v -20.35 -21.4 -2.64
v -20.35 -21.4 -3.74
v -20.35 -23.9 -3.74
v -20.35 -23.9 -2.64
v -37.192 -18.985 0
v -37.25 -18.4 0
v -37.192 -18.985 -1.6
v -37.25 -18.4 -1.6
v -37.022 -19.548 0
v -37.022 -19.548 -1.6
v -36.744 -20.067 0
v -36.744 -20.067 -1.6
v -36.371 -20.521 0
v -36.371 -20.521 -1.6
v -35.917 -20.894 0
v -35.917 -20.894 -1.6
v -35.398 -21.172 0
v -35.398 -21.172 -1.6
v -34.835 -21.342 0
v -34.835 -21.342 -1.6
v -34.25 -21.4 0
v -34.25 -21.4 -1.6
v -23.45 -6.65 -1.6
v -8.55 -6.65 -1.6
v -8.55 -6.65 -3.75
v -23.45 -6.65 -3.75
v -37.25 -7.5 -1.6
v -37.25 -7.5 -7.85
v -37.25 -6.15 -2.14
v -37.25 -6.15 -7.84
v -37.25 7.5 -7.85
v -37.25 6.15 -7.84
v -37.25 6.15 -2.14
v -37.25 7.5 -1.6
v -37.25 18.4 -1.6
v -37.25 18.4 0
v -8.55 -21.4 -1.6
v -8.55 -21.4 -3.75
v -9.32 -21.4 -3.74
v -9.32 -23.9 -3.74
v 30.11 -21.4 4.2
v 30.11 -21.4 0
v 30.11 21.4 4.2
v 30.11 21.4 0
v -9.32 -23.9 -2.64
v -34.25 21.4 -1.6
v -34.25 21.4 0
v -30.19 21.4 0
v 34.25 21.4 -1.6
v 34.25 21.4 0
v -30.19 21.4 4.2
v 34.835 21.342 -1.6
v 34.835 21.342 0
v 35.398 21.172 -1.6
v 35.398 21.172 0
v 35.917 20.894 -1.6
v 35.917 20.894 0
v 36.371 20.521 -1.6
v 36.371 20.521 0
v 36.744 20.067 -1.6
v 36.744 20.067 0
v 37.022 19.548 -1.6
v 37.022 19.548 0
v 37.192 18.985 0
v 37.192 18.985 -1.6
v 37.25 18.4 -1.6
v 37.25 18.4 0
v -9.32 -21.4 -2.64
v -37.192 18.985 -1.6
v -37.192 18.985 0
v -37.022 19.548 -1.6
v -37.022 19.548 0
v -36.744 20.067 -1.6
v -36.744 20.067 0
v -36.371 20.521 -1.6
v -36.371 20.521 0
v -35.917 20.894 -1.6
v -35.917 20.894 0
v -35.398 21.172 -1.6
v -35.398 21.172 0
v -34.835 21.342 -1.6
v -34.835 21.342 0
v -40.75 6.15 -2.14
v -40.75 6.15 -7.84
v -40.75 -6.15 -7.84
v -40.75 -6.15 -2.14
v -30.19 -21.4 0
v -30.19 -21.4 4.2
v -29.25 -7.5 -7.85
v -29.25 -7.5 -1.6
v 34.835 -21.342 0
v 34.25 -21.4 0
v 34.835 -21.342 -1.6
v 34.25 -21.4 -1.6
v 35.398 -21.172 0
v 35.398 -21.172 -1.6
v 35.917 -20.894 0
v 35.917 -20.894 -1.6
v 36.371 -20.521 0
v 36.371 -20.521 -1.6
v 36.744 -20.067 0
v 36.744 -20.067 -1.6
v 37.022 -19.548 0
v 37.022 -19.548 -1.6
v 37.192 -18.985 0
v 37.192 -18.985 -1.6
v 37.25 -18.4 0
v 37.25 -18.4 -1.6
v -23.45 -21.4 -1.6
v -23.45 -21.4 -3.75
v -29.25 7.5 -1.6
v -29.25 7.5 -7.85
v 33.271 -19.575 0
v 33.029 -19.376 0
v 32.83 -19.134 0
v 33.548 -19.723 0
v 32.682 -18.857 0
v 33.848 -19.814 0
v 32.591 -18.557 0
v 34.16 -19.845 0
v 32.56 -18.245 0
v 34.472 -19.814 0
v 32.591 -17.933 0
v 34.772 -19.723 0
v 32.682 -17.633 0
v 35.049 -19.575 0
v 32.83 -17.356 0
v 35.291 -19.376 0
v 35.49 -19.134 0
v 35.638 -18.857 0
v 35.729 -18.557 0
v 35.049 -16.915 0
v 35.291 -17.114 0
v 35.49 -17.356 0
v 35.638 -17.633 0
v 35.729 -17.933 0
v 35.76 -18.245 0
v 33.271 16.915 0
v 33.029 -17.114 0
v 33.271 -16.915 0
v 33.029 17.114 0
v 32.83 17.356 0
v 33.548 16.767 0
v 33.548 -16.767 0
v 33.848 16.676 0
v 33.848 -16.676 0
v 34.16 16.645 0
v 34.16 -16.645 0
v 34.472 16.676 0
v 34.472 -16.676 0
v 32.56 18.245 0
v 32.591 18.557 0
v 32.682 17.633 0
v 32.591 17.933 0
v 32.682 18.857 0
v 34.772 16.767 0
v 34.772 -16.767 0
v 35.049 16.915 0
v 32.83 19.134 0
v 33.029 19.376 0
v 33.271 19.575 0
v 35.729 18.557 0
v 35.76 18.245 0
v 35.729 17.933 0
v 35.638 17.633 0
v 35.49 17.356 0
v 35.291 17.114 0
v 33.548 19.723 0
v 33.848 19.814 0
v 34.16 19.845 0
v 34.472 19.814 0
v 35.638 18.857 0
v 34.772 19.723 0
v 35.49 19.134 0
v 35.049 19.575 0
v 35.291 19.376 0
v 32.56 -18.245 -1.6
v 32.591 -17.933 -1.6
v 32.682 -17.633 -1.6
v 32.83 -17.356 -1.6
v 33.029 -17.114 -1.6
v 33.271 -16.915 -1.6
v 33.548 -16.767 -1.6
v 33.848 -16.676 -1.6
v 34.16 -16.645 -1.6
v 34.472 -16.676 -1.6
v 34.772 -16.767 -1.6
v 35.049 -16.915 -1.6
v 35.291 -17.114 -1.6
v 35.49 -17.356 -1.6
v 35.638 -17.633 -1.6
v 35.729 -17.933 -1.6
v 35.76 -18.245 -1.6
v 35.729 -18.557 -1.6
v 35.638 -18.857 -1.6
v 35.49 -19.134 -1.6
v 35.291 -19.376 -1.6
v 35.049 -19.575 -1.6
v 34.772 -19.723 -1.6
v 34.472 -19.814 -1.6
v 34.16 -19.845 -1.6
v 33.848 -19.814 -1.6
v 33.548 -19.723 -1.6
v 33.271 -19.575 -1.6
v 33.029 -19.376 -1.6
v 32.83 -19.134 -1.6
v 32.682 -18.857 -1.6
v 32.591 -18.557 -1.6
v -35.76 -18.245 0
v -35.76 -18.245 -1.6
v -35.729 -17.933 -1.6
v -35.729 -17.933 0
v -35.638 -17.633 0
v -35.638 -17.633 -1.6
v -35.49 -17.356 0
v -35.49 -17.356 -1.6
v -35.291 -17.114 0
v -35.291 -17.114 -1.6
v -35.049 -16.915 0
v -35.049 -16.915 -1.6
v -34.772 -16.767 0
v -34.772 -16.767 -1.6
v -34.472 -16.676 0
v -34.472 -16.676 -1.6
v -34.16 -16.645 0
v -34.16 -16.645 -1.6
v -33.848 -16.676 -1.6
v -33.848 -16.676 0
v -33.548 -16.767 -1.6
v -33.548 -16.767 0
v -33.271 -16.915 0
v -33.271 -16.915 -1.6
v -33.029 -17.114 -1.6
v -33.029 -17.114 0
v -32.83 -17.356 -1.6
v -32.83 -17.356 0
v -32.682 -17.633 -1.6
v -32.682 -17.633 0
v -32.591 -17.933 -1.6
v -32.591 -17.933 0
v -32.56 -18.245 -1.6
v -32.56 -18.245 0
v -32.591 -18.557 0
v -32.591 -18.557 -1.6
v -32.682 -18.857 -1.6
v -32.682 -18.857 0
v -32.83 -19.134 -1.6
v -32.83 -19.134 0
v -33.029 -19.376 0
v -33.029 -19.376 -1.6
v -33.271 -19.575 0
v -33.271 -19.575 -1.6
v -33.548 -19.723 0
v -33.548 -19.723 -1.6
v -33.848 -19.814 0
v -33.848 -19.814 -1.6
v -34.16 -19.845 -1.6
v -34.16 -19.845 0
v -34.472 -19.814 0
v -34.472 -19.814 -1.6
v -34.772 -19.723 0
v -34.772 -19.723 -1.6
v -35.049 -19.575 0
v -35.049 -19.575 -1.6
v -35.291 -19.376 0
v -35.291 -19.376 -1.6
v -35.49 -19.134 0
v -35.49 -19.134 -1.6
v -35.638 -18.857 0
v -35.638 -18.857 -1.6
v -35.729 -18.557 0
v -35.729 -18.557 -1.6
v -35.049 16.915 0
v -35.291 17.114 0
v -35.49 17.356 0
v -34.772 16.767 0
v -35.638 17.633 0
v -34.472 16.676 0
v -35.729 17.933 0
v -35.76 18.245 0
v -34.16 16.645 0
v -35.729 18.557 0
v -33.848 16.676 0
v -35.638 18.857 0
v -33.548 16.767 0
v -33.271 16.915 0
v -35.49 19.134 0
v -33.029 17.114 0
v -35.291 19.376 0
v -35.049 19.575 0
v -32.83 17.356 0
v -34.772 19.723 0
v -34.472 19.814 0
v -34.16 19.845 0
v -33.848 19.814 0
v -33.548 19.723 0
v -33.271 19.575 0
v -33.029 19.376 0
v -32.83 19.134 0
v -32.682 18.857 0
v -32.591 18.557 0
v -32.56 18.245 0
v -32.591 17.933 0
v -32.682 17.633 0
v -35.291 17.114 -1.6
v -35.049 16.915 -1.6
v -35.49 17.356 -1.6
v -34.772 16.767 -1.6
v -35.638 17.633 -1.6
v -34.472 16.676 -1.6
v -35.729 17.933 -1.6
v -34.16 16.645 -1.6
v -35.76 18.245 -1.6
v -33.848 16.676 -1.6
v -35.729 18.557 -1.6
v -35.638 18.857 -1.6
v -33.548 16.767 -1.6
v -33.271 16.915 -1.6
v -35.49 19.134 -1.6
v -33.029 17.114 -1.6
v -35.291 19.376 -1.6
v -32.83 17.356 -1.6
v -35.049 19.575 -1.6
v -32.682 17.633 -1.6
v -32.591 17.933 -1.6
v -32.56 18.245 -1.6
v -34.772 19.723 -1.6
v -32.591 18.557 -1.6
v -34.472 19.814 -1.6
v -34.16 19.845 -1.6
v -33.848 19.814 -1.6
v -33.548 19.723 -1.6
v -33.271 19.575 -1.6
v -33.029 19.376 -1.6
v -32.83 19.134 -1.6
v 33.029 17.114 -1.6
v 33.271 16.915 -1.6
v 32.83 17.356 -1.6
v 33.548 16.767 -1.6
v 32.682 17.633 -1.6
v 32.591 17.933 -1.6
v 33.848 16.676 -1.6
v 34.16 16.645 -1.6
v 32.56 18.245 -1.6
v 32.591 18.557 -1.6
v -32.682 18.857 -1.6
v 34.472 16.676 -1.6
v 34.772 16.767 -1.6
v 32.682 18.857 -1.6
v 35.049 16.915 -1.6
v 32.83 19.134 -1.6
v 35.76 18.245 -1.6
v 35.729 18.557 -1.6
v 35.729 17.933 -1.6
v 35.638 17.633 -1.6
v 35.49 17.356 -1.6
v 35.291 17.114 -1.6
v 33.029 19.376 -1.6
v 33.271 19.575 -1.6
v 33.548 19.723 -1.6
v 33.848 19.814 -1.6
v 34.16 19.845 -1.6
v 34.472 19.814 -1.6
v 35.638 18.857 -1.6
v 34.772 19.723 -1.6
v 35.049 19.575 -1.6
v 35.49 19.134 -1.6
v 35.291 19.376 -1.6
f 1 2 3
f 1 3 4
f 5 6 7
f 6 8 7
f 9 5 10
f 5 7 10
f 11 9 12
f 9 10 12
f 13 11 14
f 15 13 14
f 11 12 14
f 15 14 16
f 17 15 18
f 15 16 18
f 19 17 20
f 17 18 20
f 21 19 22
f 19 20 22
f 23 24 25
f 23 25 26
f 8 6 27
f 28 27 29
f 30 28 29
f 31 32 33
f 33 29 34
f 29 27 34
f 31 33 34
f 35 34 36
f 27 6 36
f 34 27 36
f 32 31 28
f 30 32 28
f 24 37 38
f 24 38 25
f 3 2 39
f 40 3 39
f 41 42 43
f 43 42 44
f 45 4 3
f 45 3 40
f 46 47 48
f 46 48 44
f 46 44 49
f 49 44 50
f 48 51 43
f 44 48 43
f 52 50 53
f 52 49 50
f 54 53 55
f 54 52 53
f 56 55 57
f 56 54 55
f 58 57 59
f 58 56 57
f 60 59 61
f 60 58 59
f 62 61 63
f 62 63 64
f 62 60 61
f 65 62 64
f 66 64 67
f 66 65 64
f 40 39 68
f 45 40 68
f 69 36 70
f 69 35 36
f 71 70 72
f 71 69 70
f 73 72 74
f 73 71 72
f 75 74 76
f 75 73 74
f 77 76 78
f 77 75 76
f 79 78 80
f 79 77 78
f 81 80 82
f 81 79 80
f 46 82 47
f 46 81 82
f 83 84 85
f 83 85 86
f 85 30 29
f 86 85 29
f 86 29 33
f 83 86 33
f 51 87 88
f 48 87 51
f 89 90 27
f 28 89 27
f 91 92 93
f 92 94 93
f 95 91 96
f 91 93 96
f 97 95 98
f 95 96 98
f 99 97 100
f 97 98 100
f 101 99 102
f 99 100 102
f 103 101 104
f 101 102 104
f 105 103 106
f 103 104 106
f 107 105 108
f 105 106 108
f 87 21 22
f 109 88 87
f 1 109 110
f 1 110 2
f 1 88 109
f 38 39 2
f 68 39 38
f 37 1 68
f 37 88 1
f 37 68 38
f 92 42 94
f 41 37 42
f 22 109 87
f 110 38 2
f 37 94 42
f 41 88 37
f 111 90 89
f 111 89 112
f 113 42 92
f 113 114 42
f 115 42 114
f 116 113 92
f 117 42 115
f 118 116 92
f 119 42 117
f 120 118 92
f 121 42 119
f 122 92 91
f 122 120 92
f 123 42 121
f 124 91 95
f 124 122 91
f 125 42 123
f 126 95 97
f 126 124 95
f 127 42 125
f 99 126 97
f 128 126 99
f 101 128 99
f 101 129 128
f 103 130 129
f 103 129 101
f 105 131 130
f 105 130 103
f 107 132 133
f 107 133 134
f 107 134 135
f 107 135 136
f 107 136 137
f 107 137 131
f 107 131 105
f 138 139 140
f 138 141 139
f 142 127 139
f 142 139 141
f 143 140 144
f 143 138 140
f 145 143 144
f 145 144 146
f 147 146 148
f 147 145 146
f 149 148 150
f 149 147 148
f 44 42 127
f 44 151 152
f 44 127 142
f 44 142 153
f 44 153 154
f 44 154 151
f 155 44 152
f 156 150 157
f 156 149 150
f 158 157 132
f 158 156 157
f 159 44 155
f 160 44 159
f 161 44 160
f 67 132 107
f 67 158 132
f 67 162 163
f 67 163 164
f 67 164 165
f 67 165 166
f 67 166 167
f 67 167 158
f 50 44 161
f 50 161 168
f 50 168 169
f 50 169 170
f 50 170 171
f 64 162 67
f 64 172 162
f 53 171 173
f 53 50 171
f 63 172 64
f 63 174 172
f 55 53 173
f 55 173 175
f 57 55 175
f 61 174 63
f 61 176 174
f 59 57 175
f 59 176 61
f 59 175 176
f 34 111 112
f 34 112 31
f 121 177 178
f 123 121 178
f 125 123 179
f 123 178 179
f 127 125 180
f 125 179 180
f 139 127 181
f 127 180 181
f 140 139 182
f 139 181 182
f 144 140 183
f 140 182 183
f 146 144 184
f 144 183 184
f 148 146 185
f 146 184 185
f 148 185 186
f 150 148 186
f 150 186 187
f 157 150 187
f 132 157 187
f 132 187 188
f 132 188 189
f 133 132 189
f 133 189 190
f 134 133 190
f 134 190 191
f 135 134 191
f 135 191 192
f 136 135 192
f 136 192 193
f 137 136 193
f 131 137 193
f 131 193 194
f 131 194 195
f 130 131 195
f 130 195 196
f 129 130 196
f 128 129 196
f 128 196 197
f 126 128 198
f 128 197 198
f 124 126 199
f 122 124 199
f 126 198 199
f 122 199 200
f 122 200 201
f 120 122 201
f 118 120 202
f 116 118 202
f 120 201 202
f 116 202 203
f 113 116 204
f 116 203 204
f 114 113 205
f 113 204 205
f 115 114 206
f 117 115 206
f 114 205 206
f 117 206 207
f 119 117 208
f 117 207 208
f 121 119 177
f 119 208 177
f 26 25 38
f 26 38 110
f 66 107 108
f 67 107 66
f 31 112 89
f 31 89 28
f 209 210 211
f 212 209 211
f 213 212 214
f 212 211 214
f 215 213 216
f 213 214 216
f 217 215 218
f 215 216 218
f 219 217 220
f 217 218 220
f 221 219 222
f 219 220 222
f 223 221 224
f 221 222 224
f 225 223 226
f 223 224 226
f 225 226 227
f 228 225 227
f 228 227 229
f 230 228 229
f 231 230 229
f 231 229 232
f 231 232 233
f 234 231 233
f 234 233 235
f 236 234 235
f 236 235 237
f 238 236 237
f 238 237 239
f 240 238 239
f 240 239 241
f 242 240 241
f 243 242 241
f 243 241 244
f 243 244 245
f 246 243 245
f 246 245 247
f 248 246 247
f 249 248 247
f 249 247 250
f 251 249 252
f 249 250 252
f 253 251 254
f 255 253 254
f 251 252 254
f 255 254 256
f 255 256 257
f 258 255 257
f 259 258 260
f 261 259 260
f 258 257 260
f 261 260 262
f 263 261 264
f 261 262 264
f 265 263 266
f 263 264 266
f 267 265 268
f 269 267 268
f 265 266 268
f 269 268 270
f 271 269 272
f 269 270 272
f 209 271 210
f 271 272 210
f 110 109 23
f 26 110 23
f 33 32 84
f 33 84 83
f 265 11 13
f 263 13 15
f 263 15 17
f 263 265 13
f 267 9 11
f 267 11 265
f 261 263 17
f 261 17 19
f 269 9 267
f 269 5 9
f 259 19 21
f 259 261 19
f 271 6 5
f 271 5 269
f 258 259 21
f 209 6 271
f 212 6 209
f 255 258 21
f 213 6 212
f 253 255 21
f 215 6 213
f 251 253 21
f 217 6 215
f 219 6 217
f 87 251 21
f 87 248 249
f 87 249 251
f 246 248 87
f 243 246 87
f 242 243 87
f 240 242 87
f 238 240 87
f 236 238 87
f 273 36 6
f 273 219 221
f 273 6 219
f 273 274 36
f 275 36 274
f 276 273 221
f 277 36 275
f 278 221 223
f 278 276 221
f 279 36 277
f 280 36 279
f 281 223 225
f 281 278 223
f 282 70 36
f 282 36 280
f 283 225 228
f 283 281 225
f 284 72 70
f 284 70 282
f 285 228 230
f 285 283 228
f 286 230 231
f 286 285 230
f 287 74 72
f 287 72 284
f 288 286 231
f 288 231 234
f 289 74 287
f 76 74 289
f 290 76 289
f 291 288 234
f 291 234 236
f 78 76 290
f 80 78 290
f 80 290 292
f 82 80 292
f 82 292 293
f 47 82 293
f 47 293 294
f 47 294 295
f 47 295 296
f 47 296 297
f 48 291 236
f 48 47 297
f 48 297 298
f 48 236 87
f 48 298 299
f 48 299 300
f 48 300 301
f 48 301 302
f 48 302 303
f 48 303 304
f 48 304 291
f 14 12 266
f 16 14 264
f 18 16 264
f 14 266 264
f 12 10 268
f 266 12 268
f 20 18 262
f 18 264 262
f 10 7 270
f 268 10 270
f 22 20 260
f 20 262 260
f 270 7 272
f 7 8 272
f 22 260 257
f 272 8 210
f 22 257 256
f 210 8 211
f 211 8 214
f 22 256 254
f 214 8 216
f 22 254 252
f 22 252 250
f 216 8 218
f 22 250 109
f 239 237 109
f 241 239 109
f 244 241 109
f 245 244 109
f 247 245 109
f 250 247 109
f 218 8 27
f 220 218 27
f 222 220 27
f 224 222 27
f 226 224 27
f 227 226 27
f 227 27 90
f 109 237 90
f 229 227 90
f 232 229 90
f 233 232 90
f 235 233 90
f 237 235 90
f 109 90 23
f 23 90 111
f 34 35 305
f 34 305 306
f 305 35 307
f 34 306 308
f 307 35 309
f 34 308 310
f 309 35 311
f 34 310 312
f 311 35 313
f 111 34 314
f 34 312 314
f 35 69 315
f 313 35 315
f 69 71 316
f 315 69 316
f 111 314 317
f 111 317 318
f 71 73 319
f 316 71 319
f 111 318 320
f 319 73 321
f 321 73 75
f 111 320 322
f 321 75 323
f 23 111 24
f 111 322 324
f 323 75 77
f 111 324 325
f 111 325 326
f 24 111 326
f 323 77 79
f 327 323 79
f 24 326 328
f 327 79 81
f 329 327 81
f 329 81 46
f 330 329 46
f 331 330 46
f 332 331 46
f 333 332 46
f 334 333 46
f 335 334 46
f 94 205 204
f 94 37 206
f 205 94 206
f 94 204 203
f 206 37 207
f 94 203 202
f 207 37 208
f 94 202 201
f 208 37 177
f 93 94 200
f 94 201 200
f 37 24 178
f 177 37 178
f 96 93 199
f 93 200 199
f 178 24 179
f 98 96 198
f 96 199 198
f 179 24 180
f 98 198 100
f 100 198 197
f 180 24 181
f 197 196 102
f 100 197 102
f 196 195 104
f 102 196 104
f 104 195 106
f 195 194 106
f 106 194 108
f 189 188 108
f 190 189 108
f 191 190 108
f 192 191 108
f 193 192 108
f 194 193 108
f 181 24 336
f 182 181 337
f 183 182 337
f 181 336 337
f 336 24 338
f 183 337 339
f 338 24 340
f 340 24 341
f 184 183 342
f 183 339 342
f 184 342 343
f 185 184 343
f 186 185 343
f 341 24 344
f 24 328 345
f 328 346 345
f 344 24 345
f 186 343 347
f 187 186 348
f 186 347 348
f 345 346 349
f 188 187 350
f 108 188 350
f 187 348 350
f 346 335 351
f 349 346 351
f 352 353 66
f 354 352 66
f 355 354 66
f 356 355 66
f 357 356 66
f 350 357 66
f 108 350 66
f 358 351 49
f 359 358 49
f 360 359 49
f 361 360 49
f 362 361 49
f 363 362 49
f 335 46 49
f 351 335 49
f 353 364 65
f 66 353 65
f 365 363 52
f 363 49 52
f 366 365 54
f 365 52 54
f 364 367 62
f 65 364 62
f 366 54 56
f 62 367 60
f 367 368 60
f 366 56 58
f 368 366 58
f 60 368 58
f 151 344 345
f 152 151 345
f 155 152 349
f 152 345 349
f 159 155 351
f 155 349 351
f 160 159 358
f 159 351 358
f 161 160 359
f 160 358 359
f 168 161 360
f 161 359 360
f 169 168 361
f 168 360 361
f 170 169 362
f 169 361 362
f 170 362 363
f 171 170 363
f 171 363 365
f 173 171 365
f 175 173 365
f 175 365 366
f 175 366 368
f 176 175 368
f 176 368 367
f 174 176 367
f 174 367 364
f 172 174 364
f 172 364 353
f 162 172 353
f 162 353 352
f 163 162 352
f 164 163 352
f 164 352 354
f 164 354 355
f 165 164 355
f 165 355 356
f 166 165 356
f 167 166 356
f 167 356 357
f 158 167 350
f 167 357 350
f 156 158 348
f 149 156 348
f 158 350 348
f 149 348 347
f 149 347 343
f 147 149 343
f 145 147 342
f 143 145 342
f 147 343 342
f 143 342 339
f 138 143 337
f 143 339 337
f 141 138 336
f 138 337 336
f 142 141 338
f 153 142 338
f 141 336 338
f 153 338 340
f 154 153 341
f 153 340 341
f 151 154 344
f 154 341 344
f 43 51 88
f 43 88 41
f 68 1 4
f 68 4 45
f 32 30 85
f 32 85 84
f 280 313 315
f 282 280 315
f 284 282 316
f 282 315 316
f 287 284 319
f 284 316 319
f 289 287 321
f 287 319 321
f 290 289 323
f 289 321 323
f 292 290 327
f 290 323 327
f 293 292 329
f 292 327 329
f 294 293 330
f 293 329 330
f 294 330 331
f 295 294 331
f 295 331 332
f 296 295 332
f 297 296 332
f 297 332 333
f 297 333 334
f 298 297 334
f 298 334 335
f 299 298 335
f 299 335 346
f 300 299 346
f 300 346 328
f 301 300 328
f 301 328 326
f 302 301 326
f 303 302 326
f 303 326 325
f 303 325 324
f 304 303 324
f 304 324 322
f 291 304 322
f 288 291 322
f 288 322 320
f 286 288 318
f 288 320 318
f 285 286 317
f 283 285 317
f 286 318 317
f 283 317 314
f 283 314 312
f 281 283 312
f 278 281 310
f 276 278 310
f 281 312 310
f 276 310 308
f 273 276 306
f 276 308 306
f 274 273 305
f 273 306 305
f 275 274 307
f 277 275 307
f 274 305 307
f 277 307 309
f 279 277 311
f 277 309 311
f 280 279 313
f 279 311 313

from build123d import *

# Parameters (mm, degrees)
SKETCH1_W                  = 74.5
SKETCH1_H                  = 42.8
BOSS_EXTRUDE1_DEPTH        = 1.6002
SKETCH2_W                  = 60.3
SKETCH2_H                  = 42.8
BOSS_EXTRUDE2_DEPTH        = 4.2
F_3_2_3_2_DIAMETER_HOLE1_D = 3.2
FILLET1_R                  = 3
SKETCH6_W                  = 8
SKETCH6_H                  = 15
BOSS_EXTRUDE3_DEPTH        = 6.25
SKETCH7_W                  = 5.7
SKETCH7_H                  = 12.3
BOSS_EXTRUDE4_DEPTH        = 3.5
SKETCH8_W                  = 14.9
SKETCH8_H                  = 14.75
BOSS_EXTRUDE5_DEPTH        = 2.15
SKETCH9_W                  = 11.03
SKETCH9_H                  = 1.1
BOSS_EXTRUDE6_DEPTH        = 2.5


with BuildPart() as part:
    # Sketch1 → Boss-Extrude1 (new body)
    with BuildSketch(Plane.XY):
        Rectangle(SKETCH1_W, SKETCH1_H)
    extrude(amount=-BOSS_EXTRUDE1_DEPTH)

    # Sketch2 → Boss-Extrude2 (add)
    with BuildSketch(Plane.XY):
        with Locations((-0.04, 0)):
            Rectangle(SKETCH2_W, SKETCH2_H)
    extrude(amount=BOSS_EXTRUDE2_DEPTH)

    # Ø3.2 (3.2) Diameter Hole1 (through all)
    with Locations(Plane.XY):
        with Locations((-34.16, 18.245), (34.16, -18.245), (34.16, 18.245), (-34.16, -18.245)):
            Hole(F_3_2_3_2_DIAMETER_HOLE1_D / 2)

    # Fillet1
    fillet1_edges = [part.edges().sort_by_distance(p)[0] for p in [
        (37.25, 21.4, -0.8001),
        (37.25, -21.4, -0.8001),
        (-37.25, -21.4, -0.8001),
        (-37.25, 21.4, -0.8001),
    ]]
    fillet(fillet1_edges, radius=FILLET1_R)

    # Sketch6 → Boss-Extrude3 (add)
    with BuildSketch(Plane(origin=(0, 0, -1.6002), x_dir=(-1, 0, 0), z_dir=(0, 0, -1))):
        with Locations((33.25, 0)):
            Rectangle(SKETCH6_W, SKETCH6_H)
    extrude(amount=BOSS_EXTRUDE3_DEPTH)

    # Sketch7 → Boss-Extrude4 (add)
    with BuildSketch(Plane.ZY.offset(37.25)):
        with Locations((-4.9902, 0)):
            Rectangle(SKETCH7_W, SKETCH7_H)
    extrude(amount=BOSS_EXTRUDE4_DEPTH)

    # Sketch8 → Boss-Extrude5 (add)
    with BuildSketch(Plane(origin=(0, 0, -1.6002), x_dir=(-1, 0, 0), z_dir=(0, 0, -1))):
        with Locations((16, -14.025)):
            Rectangle(SKETCH8_W, SKETCH8_H)
    extrude(amount=BOSS_EXTRUDE5_DEPTH)

    # Sketch9 → Boss-Extrude6 (add)
    with BuildSketch(Plane.XZ.offset(21.4)):
        with Locations((-14.835, -3.1902)):
            Rectangle(SKETCH9_W, SKETCH9_H)
    extrude(amount=BOSS_EXTRUDE6_DEPTH)


solid = part.part
